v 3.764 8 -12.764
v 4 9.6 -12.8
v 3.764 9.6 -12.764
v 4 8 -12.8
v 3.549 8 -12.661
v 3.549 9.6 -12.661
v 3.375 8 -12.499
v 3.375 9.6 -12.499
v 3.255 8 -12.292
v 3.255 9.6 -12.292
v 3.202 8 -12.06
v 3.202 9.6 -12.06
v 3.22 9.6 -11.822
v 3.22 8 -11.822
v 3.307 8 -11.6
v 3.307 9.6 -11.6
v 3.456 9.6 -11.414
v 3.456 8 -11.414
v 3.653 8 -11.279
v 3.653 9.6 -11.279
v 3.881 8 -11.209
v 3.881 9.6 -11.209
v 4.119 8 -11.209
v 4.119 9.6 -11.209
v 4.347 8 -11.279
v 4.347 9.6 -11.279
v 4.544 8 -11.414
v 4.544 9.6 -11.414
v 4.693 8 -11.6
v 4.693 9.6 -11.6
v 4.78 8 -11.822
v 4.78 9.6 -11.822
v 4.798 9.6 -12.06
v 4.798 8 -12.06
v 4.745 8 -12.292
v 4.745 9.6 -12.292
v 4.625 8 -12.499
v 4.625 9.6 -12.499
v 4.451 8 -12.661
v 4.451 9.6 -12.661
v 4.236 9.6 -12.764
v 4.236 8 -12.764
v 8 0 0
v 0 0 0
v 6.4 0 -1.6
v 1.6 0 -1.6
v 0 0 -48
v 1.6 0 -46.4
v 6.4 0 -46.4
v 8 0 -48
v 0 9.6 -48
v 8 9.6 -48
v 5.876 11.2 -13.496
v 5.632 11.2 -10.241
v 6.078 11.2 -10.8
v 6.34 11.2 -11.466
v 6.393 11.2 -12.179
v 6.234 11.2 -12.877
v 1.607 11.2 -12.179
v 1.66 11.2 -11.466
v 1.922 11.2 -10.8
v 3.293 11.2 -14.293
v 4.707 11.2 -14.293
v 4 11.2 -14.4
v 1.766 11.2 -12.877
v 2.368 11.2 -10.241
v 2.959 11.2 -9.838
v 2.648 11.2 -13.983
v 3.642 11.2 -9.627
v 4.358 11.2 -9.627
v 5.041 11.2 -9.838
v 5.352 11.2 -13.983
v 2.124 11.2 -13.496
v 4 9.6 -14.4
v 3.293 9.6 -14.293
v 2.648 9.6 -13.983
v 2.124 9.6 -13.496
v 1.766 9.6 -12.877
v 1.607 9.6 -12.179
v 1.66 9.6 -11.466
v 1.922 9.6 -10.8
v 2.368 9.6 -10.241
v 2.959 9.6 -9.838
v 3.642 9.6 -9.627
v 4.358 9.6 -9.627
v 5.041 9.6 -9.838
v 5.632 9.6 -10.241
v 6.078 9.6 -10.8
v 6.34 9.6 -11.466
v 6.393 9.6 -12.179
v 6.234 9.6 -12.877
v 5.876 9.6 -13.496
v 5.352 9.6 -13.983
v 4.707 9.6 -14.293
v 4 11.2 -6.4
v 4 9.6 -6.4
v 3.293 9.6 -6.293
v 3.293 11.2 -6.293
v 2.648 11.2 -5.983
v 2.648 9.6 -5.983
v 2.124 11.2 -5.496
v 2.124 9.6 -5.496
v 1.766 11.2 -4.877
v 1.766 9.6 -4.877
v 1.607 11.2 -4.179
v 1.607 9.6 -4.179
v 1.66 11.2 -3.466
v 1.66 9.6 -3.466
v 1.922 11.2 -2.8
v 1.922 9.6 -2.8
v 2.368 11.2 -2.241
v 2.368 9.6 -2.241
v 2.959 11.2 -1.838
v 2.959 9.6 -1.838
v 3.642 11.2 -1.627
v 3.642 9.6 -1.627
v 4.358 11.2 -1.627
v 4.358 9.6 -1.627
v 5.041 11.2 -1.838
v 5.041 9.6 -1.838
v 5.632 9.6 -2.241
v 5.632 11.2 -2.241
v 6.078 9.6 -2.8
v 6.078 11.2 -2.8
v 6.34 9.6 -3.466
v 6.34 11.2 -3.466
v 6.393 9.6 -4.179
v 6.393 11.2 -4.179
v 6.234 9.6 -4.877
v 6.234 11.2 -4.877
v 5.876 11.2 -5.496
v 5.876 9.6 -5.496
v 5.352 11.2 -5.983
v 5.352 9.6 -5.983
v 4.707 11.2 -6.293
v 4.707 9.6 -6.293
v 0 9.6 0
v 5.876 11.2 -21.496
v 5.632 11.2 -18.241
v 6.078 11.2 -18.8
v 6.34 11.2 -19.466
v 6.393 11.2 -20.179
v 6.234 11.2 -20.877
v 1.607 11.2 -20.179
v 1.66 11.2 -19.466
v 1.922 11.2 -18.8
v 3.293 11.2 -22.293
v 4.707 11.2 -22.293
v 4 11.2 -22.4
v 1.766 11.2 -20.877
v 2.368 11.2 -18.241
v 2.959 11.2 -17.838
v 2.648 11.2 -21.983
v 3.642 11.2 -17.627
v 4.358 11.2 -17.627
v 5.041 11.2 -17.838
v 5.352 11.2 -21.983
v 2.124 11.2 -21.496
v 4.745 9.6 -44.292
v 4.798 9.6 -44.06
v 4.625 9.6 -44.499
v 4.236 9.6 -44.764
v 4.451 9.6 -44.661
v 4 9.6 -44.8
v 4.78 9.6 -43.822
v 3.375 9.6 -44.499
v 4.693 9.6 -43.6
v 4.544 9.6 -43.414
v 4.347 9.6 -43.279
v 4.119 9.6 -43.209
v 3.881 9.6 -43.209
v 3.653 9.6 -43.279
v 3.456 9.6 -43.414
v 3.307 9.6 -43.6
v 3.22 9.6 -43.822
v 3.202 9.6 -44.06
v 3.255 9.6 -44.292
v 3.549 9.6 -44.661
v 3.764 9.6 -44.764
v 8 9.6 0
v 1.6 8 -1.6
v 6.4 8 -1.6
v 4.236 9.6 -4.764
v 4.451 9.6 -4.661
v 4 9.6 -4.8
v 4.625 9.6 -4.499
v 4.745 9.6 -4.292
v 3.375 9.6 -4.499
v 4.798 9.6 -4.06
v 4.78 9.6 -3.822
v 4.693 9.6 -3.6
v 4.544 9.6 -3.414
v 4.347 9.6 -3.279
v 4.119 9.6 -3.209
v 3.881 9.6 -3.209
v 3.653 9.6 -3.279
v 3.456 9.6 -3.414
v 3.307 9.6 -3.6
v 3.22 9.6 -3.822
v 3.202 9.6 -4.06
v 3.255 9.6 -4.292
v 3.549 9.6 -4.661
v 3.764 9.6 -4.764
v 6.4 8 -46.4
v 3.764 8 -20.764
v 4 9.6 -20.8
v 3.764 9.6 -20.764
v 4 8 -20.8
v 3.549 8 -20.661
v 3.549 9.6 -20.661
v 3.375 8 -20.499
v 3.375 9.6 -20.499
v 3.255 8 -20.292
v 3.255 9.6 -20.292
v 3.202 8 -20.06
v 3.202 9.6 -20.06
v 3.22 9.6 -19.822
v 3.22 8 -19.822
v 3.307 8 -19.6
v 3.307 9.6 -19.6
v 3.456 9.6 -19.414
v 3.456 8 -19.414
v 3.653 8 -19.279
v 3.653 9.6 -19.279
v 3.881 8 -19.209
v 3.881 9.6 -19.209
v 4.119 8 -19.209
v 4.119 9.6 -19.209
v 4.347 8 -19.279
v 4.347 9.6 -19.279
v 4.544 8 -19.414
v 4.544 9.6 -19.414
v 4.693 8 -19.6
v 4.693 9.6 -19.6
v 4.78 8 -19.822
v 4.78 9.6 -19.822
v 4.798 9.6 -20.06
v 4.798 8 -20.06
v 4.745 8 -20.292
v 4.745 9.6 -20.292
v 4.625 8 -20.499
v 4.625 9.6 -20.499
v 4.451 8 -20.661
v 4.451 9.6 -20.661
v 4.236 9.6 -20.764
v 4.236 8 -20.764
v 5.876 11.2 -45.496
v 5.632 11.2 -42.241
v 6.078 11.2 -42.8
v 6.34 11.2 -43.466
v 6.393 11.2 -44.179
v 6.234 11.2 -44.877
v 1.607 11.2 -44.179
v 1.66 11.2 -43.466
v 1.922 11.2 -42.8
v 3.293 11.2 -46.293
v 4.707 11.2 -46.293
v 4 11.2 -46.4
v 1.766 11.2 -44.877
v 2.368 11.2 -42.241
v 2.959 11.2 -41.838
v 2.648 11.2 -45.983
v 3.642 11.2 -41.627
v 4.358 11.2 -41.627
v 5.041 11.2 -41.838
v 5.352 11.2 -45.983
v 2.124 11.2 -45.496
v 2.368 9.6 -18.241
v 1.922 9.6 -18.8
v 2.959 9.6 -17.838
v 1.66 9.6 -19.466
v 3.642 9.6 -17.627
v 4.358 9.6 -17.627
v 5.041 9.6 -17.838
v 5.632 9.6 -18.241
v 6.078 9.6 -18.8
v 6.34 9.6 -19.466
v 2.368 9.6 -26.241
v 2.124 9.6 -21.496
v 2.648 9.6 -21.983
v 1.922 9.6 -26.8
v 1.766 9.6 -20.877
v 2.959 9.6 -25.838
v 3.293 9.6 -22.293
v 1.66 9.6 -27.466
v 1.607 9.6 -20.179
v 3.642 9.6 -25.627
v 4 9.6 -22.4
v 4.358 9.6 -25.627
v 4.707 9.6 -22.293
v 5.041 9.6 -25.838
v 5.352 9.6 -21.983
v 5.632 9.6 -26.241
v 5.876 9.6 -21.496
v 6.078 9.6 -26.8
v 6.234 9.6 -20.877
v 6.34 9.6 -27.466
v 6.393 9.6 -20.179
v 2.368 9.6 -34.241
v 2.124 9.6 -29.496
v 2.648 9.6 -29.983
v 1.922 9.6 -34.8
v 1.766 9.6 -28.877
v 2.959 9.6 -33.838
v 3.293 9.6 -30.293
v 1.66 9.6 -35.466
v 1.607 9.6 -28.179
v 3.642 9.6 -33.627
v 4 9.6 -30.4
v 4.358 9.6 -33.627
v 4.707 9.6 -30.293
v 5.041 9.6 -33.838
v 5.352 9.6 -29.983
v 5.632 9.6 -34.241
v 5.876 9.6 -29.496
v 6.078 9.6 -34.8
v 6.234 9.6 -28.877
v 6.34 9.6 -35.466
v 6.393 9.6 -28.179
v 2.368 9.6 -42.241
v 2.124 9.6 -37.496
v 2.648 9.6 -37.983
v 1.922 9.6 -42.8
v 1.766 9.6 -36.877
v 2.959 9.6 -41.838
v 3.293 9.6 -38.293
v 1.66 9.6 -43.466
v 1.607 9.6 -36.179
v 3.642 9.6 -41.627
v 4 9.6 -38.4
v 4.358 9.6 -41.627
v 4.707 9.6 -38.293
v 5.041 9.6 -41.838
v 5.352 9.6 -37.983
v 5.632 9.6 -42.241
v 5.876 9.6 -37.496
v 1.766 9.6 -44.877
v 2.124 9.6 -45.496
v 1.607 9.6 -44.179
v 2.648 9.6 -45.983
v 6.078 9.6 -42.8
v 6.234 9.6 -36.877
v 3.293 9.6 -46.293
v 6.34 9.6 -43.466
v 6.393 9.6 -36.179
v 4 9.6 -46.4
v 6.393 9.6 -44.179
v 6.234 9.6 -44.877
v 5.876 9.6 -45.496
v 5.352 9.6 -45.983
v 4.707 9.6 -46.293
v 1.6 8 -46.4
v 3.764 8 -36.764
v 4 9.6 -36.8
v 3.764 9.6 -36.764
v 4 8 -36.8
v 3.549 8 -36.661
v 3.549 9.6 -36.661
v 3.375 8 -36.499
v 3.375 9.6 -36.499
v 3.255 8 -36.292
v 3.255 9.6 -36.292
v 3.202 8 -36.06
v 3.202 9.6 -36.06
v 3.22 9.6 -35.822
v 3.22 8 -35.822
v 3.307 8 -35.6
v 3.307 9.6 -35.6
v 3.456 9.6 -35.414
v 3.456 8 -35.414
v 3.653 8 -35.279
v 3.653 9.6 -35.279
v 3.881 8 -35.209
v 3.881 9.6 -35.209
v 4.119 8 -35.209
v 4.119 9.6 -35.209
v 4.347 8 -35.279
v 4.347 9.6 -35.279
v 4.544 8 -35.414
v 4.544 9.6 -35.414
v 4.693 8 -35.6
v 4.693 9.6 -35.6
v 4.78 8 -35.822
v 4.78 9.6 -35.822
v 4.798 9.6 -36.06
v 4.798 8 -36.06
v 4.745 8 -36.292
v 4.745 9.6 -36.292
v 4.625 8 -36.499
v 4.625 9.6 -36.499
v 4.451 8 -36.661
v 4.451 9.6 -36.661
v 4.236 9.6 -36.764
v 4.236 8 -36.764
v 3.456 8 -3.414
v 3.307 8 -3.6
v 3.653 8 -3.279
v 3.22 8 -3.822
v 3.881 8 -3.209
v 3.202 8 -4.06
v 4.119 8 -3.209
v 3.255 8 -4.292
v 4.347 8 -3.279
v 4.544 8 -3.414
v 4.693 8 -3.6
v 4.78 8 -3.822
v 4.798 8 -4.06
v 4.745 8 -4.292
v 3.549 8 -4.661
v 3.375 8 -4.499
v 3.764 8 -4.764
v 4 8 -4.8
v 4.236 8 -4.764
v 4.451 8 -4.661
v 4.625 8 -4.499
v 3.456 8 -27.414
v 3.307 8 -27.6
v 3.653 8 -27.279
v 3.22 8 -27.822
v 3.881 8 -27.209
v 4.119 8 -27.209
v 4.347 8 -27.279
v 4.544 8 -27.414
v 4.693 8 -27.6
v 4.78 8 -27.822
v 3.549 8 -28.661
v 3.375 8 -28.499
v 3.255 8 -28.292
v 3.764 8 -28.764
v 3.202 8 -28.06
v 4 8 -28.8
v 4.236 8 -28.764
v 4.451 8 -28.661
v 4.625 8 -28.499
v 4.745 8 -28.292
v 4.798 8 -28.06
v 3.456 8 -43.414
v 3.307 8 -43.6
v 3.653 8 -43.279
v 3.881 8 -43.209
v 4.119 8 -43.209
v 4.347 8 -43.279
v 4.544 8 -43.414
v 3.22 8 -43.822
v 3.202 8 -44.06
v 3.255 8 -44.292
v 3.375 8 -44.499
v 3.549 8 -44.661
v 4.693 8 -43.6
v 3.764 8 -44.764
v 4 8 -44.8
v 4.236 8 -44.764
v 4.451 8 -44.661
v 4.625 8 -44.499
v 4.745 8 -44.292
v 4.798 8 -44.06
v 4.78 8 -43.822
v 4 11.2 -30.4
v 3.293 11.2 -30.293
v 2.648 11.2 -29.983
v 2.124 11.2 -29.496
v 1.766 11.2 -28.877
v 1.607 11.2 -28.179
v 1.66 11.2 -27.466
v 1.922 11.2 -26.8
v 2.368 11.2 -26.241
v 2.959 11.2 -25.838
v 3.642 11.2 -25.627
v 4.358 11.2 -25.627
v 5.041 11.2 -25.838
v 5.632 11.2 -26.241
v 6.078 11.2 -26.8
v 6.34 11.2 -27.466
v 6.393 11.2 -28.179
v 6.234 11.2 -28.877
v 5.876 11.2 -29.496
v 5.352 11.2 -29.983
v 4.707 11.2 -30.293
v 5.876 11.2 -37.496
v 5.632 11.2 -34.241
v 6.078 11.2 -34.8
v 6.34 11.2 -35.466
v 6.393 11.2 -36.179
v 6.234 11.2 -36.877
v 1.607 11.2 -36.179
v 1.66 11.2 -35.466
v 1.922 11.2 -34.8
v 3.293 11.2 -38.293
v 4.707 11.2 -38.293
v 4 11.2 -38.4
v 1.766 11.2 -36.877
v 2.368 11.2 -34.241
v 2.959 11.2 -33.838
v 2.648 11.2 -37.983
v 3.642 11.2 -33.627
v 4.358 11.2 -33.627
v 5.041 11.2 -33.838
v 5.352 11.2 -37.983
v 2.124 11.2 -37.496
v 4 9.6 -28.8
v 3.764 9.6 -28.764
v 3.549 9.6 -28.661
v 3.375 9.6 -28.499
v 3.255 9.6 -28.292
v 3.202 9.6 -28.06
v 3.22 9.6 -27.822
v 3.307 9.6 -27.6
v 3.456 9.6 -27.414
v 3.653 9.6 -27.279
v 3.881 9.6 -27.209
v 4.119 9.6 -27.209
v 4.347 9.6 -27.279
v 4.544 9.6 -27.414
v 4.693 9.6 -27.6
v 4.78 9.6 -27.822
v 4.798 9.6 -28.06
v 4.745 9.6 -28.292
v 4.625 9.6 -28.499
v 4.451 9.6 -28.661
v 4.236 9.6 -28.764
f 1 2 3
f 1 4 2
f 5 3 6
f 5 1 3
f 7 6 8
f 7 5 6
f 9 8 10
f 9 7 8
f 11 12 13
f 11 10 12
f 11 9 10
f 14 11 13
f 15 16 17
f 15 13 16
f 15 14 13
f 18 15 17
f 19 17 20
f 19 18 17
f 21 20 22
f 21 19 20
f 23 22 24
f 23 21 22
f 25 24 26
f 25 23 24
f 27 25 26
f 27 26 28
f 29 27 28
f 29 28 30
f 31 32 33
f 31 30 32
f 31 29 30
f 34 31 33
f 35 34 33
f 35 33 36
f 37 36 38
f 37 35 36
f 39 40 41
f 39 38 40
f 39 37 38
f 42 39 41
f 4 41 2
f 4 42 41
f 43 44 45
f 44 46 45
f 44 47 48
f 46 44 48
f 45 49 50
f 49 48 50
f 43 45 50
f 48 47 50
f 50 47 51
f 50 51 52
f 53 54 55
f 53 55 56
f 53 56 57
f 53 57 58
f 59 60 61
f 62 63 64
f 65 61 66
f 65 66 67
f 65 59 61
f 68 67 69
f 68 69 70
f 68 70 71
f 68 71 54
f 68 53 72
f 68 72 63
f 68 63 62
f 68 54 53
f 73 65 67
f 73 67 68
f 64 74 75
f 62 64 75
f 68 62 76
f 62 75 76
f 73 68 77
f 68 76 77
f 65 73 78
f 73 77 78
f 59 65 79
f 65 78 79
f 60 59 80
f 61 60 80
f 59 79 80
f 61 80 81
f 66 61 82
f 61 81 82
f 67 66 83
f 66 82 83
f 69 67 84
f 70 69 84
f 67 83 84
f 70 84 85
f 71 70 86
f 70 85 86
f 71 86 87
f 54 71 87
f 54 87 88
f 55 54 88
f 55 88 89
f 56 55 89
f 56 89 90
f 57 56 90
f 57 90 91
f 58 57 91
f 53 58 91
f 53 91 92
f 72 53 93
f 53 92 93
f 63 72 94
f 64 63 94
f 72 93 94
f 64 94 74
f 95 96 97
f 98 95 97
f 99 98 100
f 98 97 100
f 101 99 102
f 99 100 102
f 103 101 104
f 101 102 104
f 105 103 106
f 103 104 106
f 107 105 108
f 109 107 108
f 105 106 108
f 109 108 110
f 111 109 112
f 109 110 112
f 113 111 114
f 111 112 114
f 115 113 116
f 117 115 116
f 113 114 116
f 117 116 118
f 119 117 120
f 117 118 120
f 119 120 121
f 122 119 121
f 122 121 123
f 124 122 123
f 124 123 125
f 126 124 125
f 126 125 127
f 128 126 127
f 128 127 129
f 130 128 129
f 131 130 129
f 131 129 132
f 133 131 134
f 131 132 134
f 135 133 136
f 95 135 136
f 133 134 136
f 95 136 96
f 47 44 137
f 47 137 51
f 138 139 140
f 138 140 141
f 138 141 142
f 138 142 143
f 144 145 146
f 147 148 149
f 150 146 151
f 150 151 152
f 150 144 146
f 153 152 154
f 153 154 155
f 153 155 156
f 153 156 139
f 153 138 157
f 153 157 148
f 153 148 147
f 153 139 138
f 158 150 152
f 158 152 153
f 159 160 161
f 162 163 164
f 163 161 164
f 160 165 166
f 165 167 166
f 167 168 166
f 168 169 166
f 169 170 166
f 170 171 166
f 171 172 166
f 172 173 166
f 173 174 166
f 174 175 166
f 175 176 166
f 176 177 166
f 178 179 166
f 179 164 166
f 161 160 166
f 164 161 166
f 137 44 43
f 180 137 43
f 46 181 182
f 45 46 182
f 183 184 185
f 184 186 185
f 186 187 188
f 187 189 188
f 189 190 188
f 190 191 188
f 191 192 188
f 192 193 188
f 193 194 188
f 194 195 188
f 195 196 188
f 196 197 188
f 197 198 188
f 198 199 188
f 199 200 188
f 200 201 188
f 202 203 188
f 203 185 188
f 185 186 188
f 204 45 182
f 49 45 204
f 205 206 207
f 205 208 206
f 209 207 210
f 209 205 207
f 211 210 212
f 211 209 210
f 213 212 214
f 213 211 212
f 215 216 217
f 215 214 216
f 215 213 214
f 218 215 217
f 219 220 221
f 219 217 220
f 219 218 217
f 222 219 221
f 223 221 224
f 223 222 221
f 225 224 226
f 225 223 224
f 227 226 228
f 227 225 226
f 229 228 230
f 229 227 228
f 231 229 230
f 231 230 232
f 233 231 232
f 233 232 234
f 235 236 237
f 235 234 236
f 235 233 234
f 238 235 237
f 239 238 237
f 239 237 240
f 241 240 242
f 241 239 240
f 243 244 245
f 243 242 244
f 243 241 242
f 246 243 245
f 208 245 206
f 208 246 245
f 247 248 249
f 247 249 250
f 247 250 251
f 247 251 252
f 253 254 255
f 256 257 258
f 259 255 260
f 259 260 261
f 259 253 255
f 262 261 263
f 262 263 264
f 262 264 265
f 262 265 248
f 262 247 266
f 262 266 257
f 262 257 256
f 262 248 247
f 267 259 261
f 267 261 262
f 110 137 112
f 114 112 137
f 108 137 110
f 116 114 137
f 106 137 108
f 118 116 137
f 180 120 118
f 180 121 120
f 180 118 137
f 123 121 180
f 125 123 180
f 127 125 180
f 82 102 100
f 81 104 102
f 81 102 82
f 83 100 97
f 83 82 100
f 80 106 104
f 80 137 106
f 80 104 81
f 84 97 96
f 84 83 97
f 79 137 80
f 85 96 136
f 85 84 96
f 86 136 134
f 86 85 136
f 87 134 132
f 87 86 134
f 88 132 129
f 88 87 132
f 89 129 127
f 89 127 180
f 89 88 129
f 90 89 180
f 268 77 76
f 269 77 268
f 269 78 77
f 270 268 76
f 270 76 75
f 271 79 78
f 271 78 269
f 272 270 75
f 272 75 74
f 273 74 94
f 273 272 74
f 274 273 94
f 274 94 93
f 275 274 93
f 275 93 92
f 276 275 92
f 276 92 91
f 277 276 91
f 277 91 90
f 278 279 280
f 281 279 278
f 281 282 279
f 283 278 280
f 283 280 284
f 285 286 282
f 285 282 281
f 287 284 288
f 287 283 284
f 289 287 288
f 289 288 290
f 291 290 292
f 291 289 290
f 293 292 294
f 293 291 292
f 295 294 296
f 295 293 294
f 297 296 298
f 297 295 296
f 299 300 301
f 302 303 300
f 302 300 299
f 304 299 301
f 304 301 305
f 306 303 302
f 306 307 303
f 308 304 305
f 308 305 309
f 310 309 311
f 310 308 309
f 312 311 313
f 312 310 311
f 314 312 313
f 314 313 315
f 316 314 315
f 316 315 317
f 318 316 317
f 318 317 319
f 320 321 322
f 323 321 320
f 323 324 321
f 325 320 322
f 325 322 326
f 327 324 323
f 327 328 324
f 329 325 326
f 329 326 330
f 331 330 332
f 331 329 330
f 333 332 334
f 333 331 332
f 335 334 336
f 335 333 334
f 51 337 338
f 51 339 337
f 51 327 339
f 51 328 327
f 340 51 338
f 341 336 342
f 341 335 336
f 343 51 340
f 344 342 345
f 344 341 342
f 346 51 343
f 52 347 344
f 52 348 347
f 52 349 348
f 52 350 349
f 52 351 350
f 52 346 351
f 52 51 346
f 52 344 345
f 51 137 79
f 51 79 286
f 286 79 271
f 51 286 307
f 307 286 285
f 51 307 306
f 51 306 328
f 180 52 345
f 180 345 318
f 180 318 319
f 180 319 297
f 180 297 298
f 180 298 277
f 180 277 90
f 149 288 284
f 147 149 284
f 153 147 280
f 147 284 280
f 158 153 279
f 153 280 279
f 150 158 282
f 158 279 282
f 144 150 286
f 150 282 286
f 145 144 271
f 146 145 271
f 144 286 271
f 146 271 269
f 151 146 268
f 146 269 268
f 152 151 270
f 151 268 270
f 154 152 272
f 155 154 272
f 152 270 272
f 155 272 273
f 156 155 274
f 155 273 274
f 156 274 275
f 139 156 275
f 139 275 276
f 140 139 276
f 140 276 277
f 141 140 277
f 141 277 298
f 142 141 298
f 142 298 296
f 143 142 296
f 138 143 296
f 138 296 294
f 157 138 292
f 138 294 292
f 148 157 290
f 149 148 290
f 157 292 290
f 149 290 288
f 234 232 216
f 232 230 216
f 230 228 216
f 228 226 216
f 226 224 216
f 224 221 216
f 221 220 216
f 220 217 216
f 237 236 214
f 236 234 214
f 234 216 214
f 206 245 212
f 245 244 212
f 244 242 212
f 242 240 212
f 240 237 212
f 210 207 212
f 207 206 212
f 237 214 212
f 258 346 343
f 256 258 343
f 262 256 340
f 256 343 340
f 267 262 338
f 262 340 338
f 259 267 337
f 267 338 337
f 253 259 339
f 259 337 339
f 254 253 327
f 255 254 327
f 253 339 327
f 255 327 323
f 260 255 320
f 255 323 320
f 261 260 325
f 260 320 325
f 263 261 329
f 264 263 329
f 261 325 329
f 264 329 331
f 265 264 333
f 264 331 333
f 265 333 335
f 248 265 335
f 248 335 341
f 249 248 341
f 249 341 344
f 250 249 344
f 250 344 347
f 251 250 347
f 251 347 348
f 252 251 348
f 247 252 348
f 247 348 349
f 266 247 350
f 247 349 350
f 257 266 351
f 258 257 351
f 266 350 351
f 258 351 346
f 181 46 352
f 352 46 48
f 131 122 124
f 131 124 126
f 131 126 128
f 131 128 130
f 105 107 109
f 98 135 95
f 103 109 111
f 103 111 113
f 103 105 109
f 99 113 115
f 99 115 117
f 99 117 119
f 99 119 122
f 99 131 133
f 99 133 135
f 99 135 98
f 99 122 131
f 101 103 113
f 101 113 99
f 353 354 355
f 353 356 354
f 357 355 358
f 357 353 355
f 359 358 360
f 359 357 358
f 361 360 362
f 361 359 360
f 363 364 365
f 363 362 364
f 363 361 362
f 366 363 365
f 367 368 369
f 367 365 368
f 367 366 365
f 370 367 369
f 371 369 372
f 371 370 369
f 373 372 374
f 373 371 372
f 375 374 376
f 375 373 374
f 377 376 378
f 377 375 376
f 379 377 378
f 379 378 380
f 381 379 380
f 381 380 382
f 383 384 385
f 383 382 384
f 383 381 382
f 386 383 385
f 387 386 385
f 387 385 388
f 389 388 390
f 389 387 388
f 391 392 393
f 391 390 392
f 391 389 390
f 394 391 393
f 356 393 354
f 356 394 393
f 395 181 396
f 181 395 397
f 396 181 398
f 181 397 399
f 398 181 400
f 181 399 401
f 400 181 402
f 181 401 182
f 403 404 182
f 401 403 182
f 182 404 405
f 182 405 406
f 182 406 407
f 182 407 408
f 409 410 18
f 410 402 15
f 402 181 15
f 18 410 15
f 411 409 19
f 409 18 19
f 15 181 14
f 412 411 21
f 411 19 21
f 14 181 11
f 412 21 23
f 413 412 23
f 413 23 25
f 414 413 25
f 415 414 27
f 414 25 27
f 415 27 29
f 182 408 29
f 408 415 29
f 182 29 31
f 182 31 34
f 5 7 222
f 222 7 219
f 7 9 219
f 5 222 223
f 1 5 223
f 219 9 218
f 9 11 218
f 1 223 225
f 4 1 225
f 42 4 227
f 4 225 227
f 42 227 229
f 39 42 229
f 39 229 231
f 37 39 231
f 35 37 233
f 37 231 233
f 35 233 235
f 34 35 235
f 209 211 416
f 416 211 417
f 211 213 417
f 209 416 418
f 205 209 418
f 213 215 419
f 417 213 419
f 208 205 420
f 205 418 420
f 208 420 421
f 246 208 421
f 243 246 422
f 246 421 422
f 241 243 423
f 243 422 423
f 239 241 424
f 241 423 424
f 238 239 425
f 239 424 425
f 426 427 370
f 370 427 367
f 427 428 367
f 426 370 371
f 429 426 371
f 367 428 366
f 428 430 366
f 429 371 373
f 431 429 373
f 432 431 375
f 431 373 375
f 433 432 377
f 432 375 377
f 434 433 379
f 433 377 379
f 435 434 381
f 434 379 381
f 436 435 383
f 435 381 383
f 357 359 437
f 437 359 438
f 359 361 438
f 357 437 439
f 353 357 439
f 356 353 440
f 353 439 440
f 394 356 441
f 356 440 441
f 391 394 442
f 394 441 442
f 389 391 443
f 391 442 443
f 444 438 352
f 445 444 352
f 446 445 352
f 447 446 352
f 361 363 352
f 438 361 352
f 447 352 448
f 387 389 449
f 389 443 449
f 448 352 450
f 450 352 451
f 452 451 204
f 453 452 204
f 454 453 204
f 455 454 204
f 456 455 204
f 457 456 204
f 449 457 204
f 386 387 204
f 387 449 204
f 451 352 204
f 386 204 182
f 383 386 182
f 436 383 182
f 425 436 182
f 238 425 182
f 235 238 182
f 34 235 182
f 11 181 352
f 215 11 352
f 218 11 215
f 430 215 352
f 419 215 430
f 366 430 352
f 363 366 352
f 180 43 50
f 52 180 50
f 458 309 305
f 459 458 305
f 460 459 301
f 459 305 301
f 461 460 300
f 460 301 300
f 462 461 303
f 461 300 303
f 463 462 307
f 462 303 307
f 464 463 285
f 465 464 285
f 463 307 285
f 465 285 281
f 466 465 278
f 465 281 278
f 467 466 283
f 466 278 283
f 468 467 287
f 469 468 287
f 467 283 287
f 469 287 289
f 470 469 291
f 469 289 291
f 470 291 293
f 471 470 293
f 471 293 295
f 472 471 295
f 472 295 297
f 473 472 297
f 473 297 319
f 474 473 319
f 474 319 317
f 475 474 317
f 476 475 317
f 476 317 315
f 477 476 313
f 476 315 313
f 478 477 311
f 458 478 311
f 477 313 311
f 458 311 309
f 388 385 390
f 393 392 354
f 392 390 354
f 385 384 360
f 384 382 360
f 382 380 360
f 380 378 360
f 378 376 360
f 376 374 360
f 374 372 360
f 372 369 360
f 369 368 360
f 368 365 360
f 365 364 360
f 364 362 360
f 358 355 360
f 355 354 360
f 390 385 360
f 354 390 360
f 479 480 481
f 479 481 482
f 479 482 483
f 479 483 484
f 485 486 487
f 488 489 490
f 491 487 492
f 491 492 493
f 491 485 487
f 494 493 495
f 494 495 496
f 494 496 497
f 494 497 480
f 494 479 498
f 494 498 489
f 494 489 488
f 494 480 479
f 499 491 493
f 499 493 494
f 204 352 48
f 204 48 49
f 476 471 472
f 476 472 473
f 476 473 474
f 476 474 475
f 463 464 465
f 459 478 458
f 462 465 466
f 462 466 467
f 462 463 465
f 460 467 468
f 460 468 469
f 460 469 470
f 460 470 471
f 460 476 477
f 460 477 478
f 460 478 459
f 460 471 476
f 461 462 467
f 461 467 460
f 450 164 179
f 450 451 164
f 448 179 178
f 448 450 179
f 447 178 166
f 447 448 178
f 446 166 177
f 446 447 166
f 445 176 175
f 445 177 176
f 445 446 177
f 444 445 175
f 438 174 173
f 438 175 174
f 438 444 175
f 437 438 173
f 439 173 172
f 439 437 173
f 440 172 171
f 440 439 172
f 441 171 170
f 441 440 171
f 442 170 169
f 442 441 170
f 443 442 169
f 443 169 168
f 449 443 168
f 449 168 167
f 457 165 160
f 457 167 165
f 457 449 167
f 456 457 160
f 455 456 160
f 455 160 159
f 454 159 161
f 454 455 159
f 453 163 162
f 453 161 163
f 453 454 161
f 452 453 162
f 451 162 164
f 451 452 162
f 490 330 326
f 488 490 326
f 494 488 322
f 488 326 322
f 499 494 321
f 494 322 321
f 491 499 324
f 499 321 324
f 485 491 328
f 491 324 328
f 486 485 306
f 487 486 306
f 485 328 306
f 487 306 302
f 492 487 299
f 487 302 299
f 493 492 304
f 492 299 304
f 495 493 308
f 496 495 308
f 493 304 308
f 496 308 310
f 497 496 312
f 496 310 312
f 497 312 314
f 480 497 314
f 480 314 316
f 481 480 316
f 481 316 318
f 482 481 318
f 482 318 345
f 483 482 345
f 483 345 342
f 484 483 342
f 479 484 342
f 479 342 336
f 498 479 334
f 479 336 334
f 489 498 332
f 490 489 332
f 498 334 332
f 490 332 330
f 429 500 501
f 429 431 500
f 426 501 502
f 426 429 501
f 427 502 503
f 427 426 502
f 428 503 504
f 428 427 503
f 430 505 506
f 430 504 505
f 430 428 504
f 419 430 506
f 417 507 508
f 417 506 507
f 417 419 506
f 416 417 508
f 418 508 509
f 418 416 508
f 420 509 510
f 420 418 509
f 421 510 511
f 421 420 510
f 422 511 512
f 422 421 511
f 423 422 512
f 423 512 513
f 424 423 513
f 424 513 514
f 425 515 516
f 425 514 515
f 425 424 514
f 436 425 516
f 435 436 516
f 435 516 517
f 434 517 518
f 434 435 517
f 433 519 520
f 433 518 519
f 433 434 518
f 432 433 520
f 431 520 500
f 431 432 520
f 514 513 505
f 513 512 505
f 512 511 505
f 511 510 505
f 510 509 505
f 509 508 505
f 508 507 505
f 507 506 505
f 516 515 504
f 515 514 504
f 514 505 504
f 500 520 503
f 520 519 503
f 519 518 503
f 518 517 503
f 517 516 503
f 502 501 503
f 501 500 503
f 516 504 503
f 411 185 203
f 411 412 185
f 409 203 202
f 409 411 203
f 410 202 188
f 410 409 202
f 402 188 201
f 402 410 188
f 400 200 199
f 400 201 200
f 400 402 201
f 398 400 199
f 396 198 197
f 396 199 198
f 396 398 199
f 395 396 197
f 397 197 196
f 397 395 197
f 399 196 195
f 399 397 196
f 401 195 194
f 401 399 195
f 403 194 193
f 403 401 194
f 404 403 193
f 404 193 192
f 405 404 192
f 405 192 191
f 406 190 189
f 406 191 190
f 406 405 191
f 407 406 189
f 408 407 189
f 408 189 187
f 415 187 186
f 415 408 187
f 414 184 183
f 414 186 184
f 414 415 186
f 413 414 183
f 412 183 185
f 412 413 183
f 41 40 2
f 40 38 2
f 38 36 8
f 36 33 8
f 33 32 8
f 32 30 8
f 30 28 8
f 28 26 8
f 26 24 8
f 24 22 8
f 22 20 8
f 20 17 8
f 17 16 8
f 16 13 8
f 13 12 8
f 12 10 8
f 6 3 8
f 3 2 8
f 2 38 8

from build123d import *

# Parameters (mm, degrees)
SKETCH1_W            = 8
SKETCH1_H            = 48
BOSS_EXTRUDE1_DEPTH  = 9.6
SKETCH2_R            = 2.4
BOSS_EXTRUDE2_DEPTH  = 1.6
LPATTERN1_COUNT      = 2
LPATTERN1_PITCH      = 8
LPATTERN1_COUNT_DIR2 = 6
LPATTERN1_PITCH_DIR2 = 8
SHELL1_T             = -1.6


with BuildPart() as part:
    # Sketch1 → Boss-Extrude1 (new body)
    with BuildSketch(Plane(origin=(0, 0, 0), x_dir=(1, 0, 0), z_dir=(0, 1, 0))):
        with Locations((4, 24)):
            Rectangle(SKETCH1_W, SKETCH1_H)
    extrude(amount=BOSS_EXTRUDE1_DEPTH)

    # Sketch2 → Boss-Extrude2 (add)
    with BuildSketch(Plane(origin=(0, 9.6, 0), x_dir=(1, 0, 0), z_dir=(0, 1, 0))):
        with Locations(Location((4, 4, 0), (0, 0, 90))):
            Circle(SKETCH2_R)
    boss_extrude2 = extrude(amount=BOSS_EXTRUDE2_DEPTH)

    # LPattern1: Boss-Extrude2 2 × 6, 6 skipped
    with Locations(*[(i * LPATTERN1_PITCH, 0, -j * LPATTERN1_PITCH_DIR2) for i in range(LPATTERN1_COUNT) for j in range(LPATTERN1_COUNT_DIR2) if (i, j) not in ((0, 0), (1, 0), (1, 1), (1, 2), (1, 3), (1, 4), (1, 5))]):
        add(boss_extrude2)

    # Shell1
    shell1_openings = [part.faces().sort_by_distance(p)[0] for p in [
        (4, 0, -24),
    ]]
    offset(amount=SHELL1_T, openings=shell1_openings, kind=Kind.INTERSECTION)


solid = part.part
